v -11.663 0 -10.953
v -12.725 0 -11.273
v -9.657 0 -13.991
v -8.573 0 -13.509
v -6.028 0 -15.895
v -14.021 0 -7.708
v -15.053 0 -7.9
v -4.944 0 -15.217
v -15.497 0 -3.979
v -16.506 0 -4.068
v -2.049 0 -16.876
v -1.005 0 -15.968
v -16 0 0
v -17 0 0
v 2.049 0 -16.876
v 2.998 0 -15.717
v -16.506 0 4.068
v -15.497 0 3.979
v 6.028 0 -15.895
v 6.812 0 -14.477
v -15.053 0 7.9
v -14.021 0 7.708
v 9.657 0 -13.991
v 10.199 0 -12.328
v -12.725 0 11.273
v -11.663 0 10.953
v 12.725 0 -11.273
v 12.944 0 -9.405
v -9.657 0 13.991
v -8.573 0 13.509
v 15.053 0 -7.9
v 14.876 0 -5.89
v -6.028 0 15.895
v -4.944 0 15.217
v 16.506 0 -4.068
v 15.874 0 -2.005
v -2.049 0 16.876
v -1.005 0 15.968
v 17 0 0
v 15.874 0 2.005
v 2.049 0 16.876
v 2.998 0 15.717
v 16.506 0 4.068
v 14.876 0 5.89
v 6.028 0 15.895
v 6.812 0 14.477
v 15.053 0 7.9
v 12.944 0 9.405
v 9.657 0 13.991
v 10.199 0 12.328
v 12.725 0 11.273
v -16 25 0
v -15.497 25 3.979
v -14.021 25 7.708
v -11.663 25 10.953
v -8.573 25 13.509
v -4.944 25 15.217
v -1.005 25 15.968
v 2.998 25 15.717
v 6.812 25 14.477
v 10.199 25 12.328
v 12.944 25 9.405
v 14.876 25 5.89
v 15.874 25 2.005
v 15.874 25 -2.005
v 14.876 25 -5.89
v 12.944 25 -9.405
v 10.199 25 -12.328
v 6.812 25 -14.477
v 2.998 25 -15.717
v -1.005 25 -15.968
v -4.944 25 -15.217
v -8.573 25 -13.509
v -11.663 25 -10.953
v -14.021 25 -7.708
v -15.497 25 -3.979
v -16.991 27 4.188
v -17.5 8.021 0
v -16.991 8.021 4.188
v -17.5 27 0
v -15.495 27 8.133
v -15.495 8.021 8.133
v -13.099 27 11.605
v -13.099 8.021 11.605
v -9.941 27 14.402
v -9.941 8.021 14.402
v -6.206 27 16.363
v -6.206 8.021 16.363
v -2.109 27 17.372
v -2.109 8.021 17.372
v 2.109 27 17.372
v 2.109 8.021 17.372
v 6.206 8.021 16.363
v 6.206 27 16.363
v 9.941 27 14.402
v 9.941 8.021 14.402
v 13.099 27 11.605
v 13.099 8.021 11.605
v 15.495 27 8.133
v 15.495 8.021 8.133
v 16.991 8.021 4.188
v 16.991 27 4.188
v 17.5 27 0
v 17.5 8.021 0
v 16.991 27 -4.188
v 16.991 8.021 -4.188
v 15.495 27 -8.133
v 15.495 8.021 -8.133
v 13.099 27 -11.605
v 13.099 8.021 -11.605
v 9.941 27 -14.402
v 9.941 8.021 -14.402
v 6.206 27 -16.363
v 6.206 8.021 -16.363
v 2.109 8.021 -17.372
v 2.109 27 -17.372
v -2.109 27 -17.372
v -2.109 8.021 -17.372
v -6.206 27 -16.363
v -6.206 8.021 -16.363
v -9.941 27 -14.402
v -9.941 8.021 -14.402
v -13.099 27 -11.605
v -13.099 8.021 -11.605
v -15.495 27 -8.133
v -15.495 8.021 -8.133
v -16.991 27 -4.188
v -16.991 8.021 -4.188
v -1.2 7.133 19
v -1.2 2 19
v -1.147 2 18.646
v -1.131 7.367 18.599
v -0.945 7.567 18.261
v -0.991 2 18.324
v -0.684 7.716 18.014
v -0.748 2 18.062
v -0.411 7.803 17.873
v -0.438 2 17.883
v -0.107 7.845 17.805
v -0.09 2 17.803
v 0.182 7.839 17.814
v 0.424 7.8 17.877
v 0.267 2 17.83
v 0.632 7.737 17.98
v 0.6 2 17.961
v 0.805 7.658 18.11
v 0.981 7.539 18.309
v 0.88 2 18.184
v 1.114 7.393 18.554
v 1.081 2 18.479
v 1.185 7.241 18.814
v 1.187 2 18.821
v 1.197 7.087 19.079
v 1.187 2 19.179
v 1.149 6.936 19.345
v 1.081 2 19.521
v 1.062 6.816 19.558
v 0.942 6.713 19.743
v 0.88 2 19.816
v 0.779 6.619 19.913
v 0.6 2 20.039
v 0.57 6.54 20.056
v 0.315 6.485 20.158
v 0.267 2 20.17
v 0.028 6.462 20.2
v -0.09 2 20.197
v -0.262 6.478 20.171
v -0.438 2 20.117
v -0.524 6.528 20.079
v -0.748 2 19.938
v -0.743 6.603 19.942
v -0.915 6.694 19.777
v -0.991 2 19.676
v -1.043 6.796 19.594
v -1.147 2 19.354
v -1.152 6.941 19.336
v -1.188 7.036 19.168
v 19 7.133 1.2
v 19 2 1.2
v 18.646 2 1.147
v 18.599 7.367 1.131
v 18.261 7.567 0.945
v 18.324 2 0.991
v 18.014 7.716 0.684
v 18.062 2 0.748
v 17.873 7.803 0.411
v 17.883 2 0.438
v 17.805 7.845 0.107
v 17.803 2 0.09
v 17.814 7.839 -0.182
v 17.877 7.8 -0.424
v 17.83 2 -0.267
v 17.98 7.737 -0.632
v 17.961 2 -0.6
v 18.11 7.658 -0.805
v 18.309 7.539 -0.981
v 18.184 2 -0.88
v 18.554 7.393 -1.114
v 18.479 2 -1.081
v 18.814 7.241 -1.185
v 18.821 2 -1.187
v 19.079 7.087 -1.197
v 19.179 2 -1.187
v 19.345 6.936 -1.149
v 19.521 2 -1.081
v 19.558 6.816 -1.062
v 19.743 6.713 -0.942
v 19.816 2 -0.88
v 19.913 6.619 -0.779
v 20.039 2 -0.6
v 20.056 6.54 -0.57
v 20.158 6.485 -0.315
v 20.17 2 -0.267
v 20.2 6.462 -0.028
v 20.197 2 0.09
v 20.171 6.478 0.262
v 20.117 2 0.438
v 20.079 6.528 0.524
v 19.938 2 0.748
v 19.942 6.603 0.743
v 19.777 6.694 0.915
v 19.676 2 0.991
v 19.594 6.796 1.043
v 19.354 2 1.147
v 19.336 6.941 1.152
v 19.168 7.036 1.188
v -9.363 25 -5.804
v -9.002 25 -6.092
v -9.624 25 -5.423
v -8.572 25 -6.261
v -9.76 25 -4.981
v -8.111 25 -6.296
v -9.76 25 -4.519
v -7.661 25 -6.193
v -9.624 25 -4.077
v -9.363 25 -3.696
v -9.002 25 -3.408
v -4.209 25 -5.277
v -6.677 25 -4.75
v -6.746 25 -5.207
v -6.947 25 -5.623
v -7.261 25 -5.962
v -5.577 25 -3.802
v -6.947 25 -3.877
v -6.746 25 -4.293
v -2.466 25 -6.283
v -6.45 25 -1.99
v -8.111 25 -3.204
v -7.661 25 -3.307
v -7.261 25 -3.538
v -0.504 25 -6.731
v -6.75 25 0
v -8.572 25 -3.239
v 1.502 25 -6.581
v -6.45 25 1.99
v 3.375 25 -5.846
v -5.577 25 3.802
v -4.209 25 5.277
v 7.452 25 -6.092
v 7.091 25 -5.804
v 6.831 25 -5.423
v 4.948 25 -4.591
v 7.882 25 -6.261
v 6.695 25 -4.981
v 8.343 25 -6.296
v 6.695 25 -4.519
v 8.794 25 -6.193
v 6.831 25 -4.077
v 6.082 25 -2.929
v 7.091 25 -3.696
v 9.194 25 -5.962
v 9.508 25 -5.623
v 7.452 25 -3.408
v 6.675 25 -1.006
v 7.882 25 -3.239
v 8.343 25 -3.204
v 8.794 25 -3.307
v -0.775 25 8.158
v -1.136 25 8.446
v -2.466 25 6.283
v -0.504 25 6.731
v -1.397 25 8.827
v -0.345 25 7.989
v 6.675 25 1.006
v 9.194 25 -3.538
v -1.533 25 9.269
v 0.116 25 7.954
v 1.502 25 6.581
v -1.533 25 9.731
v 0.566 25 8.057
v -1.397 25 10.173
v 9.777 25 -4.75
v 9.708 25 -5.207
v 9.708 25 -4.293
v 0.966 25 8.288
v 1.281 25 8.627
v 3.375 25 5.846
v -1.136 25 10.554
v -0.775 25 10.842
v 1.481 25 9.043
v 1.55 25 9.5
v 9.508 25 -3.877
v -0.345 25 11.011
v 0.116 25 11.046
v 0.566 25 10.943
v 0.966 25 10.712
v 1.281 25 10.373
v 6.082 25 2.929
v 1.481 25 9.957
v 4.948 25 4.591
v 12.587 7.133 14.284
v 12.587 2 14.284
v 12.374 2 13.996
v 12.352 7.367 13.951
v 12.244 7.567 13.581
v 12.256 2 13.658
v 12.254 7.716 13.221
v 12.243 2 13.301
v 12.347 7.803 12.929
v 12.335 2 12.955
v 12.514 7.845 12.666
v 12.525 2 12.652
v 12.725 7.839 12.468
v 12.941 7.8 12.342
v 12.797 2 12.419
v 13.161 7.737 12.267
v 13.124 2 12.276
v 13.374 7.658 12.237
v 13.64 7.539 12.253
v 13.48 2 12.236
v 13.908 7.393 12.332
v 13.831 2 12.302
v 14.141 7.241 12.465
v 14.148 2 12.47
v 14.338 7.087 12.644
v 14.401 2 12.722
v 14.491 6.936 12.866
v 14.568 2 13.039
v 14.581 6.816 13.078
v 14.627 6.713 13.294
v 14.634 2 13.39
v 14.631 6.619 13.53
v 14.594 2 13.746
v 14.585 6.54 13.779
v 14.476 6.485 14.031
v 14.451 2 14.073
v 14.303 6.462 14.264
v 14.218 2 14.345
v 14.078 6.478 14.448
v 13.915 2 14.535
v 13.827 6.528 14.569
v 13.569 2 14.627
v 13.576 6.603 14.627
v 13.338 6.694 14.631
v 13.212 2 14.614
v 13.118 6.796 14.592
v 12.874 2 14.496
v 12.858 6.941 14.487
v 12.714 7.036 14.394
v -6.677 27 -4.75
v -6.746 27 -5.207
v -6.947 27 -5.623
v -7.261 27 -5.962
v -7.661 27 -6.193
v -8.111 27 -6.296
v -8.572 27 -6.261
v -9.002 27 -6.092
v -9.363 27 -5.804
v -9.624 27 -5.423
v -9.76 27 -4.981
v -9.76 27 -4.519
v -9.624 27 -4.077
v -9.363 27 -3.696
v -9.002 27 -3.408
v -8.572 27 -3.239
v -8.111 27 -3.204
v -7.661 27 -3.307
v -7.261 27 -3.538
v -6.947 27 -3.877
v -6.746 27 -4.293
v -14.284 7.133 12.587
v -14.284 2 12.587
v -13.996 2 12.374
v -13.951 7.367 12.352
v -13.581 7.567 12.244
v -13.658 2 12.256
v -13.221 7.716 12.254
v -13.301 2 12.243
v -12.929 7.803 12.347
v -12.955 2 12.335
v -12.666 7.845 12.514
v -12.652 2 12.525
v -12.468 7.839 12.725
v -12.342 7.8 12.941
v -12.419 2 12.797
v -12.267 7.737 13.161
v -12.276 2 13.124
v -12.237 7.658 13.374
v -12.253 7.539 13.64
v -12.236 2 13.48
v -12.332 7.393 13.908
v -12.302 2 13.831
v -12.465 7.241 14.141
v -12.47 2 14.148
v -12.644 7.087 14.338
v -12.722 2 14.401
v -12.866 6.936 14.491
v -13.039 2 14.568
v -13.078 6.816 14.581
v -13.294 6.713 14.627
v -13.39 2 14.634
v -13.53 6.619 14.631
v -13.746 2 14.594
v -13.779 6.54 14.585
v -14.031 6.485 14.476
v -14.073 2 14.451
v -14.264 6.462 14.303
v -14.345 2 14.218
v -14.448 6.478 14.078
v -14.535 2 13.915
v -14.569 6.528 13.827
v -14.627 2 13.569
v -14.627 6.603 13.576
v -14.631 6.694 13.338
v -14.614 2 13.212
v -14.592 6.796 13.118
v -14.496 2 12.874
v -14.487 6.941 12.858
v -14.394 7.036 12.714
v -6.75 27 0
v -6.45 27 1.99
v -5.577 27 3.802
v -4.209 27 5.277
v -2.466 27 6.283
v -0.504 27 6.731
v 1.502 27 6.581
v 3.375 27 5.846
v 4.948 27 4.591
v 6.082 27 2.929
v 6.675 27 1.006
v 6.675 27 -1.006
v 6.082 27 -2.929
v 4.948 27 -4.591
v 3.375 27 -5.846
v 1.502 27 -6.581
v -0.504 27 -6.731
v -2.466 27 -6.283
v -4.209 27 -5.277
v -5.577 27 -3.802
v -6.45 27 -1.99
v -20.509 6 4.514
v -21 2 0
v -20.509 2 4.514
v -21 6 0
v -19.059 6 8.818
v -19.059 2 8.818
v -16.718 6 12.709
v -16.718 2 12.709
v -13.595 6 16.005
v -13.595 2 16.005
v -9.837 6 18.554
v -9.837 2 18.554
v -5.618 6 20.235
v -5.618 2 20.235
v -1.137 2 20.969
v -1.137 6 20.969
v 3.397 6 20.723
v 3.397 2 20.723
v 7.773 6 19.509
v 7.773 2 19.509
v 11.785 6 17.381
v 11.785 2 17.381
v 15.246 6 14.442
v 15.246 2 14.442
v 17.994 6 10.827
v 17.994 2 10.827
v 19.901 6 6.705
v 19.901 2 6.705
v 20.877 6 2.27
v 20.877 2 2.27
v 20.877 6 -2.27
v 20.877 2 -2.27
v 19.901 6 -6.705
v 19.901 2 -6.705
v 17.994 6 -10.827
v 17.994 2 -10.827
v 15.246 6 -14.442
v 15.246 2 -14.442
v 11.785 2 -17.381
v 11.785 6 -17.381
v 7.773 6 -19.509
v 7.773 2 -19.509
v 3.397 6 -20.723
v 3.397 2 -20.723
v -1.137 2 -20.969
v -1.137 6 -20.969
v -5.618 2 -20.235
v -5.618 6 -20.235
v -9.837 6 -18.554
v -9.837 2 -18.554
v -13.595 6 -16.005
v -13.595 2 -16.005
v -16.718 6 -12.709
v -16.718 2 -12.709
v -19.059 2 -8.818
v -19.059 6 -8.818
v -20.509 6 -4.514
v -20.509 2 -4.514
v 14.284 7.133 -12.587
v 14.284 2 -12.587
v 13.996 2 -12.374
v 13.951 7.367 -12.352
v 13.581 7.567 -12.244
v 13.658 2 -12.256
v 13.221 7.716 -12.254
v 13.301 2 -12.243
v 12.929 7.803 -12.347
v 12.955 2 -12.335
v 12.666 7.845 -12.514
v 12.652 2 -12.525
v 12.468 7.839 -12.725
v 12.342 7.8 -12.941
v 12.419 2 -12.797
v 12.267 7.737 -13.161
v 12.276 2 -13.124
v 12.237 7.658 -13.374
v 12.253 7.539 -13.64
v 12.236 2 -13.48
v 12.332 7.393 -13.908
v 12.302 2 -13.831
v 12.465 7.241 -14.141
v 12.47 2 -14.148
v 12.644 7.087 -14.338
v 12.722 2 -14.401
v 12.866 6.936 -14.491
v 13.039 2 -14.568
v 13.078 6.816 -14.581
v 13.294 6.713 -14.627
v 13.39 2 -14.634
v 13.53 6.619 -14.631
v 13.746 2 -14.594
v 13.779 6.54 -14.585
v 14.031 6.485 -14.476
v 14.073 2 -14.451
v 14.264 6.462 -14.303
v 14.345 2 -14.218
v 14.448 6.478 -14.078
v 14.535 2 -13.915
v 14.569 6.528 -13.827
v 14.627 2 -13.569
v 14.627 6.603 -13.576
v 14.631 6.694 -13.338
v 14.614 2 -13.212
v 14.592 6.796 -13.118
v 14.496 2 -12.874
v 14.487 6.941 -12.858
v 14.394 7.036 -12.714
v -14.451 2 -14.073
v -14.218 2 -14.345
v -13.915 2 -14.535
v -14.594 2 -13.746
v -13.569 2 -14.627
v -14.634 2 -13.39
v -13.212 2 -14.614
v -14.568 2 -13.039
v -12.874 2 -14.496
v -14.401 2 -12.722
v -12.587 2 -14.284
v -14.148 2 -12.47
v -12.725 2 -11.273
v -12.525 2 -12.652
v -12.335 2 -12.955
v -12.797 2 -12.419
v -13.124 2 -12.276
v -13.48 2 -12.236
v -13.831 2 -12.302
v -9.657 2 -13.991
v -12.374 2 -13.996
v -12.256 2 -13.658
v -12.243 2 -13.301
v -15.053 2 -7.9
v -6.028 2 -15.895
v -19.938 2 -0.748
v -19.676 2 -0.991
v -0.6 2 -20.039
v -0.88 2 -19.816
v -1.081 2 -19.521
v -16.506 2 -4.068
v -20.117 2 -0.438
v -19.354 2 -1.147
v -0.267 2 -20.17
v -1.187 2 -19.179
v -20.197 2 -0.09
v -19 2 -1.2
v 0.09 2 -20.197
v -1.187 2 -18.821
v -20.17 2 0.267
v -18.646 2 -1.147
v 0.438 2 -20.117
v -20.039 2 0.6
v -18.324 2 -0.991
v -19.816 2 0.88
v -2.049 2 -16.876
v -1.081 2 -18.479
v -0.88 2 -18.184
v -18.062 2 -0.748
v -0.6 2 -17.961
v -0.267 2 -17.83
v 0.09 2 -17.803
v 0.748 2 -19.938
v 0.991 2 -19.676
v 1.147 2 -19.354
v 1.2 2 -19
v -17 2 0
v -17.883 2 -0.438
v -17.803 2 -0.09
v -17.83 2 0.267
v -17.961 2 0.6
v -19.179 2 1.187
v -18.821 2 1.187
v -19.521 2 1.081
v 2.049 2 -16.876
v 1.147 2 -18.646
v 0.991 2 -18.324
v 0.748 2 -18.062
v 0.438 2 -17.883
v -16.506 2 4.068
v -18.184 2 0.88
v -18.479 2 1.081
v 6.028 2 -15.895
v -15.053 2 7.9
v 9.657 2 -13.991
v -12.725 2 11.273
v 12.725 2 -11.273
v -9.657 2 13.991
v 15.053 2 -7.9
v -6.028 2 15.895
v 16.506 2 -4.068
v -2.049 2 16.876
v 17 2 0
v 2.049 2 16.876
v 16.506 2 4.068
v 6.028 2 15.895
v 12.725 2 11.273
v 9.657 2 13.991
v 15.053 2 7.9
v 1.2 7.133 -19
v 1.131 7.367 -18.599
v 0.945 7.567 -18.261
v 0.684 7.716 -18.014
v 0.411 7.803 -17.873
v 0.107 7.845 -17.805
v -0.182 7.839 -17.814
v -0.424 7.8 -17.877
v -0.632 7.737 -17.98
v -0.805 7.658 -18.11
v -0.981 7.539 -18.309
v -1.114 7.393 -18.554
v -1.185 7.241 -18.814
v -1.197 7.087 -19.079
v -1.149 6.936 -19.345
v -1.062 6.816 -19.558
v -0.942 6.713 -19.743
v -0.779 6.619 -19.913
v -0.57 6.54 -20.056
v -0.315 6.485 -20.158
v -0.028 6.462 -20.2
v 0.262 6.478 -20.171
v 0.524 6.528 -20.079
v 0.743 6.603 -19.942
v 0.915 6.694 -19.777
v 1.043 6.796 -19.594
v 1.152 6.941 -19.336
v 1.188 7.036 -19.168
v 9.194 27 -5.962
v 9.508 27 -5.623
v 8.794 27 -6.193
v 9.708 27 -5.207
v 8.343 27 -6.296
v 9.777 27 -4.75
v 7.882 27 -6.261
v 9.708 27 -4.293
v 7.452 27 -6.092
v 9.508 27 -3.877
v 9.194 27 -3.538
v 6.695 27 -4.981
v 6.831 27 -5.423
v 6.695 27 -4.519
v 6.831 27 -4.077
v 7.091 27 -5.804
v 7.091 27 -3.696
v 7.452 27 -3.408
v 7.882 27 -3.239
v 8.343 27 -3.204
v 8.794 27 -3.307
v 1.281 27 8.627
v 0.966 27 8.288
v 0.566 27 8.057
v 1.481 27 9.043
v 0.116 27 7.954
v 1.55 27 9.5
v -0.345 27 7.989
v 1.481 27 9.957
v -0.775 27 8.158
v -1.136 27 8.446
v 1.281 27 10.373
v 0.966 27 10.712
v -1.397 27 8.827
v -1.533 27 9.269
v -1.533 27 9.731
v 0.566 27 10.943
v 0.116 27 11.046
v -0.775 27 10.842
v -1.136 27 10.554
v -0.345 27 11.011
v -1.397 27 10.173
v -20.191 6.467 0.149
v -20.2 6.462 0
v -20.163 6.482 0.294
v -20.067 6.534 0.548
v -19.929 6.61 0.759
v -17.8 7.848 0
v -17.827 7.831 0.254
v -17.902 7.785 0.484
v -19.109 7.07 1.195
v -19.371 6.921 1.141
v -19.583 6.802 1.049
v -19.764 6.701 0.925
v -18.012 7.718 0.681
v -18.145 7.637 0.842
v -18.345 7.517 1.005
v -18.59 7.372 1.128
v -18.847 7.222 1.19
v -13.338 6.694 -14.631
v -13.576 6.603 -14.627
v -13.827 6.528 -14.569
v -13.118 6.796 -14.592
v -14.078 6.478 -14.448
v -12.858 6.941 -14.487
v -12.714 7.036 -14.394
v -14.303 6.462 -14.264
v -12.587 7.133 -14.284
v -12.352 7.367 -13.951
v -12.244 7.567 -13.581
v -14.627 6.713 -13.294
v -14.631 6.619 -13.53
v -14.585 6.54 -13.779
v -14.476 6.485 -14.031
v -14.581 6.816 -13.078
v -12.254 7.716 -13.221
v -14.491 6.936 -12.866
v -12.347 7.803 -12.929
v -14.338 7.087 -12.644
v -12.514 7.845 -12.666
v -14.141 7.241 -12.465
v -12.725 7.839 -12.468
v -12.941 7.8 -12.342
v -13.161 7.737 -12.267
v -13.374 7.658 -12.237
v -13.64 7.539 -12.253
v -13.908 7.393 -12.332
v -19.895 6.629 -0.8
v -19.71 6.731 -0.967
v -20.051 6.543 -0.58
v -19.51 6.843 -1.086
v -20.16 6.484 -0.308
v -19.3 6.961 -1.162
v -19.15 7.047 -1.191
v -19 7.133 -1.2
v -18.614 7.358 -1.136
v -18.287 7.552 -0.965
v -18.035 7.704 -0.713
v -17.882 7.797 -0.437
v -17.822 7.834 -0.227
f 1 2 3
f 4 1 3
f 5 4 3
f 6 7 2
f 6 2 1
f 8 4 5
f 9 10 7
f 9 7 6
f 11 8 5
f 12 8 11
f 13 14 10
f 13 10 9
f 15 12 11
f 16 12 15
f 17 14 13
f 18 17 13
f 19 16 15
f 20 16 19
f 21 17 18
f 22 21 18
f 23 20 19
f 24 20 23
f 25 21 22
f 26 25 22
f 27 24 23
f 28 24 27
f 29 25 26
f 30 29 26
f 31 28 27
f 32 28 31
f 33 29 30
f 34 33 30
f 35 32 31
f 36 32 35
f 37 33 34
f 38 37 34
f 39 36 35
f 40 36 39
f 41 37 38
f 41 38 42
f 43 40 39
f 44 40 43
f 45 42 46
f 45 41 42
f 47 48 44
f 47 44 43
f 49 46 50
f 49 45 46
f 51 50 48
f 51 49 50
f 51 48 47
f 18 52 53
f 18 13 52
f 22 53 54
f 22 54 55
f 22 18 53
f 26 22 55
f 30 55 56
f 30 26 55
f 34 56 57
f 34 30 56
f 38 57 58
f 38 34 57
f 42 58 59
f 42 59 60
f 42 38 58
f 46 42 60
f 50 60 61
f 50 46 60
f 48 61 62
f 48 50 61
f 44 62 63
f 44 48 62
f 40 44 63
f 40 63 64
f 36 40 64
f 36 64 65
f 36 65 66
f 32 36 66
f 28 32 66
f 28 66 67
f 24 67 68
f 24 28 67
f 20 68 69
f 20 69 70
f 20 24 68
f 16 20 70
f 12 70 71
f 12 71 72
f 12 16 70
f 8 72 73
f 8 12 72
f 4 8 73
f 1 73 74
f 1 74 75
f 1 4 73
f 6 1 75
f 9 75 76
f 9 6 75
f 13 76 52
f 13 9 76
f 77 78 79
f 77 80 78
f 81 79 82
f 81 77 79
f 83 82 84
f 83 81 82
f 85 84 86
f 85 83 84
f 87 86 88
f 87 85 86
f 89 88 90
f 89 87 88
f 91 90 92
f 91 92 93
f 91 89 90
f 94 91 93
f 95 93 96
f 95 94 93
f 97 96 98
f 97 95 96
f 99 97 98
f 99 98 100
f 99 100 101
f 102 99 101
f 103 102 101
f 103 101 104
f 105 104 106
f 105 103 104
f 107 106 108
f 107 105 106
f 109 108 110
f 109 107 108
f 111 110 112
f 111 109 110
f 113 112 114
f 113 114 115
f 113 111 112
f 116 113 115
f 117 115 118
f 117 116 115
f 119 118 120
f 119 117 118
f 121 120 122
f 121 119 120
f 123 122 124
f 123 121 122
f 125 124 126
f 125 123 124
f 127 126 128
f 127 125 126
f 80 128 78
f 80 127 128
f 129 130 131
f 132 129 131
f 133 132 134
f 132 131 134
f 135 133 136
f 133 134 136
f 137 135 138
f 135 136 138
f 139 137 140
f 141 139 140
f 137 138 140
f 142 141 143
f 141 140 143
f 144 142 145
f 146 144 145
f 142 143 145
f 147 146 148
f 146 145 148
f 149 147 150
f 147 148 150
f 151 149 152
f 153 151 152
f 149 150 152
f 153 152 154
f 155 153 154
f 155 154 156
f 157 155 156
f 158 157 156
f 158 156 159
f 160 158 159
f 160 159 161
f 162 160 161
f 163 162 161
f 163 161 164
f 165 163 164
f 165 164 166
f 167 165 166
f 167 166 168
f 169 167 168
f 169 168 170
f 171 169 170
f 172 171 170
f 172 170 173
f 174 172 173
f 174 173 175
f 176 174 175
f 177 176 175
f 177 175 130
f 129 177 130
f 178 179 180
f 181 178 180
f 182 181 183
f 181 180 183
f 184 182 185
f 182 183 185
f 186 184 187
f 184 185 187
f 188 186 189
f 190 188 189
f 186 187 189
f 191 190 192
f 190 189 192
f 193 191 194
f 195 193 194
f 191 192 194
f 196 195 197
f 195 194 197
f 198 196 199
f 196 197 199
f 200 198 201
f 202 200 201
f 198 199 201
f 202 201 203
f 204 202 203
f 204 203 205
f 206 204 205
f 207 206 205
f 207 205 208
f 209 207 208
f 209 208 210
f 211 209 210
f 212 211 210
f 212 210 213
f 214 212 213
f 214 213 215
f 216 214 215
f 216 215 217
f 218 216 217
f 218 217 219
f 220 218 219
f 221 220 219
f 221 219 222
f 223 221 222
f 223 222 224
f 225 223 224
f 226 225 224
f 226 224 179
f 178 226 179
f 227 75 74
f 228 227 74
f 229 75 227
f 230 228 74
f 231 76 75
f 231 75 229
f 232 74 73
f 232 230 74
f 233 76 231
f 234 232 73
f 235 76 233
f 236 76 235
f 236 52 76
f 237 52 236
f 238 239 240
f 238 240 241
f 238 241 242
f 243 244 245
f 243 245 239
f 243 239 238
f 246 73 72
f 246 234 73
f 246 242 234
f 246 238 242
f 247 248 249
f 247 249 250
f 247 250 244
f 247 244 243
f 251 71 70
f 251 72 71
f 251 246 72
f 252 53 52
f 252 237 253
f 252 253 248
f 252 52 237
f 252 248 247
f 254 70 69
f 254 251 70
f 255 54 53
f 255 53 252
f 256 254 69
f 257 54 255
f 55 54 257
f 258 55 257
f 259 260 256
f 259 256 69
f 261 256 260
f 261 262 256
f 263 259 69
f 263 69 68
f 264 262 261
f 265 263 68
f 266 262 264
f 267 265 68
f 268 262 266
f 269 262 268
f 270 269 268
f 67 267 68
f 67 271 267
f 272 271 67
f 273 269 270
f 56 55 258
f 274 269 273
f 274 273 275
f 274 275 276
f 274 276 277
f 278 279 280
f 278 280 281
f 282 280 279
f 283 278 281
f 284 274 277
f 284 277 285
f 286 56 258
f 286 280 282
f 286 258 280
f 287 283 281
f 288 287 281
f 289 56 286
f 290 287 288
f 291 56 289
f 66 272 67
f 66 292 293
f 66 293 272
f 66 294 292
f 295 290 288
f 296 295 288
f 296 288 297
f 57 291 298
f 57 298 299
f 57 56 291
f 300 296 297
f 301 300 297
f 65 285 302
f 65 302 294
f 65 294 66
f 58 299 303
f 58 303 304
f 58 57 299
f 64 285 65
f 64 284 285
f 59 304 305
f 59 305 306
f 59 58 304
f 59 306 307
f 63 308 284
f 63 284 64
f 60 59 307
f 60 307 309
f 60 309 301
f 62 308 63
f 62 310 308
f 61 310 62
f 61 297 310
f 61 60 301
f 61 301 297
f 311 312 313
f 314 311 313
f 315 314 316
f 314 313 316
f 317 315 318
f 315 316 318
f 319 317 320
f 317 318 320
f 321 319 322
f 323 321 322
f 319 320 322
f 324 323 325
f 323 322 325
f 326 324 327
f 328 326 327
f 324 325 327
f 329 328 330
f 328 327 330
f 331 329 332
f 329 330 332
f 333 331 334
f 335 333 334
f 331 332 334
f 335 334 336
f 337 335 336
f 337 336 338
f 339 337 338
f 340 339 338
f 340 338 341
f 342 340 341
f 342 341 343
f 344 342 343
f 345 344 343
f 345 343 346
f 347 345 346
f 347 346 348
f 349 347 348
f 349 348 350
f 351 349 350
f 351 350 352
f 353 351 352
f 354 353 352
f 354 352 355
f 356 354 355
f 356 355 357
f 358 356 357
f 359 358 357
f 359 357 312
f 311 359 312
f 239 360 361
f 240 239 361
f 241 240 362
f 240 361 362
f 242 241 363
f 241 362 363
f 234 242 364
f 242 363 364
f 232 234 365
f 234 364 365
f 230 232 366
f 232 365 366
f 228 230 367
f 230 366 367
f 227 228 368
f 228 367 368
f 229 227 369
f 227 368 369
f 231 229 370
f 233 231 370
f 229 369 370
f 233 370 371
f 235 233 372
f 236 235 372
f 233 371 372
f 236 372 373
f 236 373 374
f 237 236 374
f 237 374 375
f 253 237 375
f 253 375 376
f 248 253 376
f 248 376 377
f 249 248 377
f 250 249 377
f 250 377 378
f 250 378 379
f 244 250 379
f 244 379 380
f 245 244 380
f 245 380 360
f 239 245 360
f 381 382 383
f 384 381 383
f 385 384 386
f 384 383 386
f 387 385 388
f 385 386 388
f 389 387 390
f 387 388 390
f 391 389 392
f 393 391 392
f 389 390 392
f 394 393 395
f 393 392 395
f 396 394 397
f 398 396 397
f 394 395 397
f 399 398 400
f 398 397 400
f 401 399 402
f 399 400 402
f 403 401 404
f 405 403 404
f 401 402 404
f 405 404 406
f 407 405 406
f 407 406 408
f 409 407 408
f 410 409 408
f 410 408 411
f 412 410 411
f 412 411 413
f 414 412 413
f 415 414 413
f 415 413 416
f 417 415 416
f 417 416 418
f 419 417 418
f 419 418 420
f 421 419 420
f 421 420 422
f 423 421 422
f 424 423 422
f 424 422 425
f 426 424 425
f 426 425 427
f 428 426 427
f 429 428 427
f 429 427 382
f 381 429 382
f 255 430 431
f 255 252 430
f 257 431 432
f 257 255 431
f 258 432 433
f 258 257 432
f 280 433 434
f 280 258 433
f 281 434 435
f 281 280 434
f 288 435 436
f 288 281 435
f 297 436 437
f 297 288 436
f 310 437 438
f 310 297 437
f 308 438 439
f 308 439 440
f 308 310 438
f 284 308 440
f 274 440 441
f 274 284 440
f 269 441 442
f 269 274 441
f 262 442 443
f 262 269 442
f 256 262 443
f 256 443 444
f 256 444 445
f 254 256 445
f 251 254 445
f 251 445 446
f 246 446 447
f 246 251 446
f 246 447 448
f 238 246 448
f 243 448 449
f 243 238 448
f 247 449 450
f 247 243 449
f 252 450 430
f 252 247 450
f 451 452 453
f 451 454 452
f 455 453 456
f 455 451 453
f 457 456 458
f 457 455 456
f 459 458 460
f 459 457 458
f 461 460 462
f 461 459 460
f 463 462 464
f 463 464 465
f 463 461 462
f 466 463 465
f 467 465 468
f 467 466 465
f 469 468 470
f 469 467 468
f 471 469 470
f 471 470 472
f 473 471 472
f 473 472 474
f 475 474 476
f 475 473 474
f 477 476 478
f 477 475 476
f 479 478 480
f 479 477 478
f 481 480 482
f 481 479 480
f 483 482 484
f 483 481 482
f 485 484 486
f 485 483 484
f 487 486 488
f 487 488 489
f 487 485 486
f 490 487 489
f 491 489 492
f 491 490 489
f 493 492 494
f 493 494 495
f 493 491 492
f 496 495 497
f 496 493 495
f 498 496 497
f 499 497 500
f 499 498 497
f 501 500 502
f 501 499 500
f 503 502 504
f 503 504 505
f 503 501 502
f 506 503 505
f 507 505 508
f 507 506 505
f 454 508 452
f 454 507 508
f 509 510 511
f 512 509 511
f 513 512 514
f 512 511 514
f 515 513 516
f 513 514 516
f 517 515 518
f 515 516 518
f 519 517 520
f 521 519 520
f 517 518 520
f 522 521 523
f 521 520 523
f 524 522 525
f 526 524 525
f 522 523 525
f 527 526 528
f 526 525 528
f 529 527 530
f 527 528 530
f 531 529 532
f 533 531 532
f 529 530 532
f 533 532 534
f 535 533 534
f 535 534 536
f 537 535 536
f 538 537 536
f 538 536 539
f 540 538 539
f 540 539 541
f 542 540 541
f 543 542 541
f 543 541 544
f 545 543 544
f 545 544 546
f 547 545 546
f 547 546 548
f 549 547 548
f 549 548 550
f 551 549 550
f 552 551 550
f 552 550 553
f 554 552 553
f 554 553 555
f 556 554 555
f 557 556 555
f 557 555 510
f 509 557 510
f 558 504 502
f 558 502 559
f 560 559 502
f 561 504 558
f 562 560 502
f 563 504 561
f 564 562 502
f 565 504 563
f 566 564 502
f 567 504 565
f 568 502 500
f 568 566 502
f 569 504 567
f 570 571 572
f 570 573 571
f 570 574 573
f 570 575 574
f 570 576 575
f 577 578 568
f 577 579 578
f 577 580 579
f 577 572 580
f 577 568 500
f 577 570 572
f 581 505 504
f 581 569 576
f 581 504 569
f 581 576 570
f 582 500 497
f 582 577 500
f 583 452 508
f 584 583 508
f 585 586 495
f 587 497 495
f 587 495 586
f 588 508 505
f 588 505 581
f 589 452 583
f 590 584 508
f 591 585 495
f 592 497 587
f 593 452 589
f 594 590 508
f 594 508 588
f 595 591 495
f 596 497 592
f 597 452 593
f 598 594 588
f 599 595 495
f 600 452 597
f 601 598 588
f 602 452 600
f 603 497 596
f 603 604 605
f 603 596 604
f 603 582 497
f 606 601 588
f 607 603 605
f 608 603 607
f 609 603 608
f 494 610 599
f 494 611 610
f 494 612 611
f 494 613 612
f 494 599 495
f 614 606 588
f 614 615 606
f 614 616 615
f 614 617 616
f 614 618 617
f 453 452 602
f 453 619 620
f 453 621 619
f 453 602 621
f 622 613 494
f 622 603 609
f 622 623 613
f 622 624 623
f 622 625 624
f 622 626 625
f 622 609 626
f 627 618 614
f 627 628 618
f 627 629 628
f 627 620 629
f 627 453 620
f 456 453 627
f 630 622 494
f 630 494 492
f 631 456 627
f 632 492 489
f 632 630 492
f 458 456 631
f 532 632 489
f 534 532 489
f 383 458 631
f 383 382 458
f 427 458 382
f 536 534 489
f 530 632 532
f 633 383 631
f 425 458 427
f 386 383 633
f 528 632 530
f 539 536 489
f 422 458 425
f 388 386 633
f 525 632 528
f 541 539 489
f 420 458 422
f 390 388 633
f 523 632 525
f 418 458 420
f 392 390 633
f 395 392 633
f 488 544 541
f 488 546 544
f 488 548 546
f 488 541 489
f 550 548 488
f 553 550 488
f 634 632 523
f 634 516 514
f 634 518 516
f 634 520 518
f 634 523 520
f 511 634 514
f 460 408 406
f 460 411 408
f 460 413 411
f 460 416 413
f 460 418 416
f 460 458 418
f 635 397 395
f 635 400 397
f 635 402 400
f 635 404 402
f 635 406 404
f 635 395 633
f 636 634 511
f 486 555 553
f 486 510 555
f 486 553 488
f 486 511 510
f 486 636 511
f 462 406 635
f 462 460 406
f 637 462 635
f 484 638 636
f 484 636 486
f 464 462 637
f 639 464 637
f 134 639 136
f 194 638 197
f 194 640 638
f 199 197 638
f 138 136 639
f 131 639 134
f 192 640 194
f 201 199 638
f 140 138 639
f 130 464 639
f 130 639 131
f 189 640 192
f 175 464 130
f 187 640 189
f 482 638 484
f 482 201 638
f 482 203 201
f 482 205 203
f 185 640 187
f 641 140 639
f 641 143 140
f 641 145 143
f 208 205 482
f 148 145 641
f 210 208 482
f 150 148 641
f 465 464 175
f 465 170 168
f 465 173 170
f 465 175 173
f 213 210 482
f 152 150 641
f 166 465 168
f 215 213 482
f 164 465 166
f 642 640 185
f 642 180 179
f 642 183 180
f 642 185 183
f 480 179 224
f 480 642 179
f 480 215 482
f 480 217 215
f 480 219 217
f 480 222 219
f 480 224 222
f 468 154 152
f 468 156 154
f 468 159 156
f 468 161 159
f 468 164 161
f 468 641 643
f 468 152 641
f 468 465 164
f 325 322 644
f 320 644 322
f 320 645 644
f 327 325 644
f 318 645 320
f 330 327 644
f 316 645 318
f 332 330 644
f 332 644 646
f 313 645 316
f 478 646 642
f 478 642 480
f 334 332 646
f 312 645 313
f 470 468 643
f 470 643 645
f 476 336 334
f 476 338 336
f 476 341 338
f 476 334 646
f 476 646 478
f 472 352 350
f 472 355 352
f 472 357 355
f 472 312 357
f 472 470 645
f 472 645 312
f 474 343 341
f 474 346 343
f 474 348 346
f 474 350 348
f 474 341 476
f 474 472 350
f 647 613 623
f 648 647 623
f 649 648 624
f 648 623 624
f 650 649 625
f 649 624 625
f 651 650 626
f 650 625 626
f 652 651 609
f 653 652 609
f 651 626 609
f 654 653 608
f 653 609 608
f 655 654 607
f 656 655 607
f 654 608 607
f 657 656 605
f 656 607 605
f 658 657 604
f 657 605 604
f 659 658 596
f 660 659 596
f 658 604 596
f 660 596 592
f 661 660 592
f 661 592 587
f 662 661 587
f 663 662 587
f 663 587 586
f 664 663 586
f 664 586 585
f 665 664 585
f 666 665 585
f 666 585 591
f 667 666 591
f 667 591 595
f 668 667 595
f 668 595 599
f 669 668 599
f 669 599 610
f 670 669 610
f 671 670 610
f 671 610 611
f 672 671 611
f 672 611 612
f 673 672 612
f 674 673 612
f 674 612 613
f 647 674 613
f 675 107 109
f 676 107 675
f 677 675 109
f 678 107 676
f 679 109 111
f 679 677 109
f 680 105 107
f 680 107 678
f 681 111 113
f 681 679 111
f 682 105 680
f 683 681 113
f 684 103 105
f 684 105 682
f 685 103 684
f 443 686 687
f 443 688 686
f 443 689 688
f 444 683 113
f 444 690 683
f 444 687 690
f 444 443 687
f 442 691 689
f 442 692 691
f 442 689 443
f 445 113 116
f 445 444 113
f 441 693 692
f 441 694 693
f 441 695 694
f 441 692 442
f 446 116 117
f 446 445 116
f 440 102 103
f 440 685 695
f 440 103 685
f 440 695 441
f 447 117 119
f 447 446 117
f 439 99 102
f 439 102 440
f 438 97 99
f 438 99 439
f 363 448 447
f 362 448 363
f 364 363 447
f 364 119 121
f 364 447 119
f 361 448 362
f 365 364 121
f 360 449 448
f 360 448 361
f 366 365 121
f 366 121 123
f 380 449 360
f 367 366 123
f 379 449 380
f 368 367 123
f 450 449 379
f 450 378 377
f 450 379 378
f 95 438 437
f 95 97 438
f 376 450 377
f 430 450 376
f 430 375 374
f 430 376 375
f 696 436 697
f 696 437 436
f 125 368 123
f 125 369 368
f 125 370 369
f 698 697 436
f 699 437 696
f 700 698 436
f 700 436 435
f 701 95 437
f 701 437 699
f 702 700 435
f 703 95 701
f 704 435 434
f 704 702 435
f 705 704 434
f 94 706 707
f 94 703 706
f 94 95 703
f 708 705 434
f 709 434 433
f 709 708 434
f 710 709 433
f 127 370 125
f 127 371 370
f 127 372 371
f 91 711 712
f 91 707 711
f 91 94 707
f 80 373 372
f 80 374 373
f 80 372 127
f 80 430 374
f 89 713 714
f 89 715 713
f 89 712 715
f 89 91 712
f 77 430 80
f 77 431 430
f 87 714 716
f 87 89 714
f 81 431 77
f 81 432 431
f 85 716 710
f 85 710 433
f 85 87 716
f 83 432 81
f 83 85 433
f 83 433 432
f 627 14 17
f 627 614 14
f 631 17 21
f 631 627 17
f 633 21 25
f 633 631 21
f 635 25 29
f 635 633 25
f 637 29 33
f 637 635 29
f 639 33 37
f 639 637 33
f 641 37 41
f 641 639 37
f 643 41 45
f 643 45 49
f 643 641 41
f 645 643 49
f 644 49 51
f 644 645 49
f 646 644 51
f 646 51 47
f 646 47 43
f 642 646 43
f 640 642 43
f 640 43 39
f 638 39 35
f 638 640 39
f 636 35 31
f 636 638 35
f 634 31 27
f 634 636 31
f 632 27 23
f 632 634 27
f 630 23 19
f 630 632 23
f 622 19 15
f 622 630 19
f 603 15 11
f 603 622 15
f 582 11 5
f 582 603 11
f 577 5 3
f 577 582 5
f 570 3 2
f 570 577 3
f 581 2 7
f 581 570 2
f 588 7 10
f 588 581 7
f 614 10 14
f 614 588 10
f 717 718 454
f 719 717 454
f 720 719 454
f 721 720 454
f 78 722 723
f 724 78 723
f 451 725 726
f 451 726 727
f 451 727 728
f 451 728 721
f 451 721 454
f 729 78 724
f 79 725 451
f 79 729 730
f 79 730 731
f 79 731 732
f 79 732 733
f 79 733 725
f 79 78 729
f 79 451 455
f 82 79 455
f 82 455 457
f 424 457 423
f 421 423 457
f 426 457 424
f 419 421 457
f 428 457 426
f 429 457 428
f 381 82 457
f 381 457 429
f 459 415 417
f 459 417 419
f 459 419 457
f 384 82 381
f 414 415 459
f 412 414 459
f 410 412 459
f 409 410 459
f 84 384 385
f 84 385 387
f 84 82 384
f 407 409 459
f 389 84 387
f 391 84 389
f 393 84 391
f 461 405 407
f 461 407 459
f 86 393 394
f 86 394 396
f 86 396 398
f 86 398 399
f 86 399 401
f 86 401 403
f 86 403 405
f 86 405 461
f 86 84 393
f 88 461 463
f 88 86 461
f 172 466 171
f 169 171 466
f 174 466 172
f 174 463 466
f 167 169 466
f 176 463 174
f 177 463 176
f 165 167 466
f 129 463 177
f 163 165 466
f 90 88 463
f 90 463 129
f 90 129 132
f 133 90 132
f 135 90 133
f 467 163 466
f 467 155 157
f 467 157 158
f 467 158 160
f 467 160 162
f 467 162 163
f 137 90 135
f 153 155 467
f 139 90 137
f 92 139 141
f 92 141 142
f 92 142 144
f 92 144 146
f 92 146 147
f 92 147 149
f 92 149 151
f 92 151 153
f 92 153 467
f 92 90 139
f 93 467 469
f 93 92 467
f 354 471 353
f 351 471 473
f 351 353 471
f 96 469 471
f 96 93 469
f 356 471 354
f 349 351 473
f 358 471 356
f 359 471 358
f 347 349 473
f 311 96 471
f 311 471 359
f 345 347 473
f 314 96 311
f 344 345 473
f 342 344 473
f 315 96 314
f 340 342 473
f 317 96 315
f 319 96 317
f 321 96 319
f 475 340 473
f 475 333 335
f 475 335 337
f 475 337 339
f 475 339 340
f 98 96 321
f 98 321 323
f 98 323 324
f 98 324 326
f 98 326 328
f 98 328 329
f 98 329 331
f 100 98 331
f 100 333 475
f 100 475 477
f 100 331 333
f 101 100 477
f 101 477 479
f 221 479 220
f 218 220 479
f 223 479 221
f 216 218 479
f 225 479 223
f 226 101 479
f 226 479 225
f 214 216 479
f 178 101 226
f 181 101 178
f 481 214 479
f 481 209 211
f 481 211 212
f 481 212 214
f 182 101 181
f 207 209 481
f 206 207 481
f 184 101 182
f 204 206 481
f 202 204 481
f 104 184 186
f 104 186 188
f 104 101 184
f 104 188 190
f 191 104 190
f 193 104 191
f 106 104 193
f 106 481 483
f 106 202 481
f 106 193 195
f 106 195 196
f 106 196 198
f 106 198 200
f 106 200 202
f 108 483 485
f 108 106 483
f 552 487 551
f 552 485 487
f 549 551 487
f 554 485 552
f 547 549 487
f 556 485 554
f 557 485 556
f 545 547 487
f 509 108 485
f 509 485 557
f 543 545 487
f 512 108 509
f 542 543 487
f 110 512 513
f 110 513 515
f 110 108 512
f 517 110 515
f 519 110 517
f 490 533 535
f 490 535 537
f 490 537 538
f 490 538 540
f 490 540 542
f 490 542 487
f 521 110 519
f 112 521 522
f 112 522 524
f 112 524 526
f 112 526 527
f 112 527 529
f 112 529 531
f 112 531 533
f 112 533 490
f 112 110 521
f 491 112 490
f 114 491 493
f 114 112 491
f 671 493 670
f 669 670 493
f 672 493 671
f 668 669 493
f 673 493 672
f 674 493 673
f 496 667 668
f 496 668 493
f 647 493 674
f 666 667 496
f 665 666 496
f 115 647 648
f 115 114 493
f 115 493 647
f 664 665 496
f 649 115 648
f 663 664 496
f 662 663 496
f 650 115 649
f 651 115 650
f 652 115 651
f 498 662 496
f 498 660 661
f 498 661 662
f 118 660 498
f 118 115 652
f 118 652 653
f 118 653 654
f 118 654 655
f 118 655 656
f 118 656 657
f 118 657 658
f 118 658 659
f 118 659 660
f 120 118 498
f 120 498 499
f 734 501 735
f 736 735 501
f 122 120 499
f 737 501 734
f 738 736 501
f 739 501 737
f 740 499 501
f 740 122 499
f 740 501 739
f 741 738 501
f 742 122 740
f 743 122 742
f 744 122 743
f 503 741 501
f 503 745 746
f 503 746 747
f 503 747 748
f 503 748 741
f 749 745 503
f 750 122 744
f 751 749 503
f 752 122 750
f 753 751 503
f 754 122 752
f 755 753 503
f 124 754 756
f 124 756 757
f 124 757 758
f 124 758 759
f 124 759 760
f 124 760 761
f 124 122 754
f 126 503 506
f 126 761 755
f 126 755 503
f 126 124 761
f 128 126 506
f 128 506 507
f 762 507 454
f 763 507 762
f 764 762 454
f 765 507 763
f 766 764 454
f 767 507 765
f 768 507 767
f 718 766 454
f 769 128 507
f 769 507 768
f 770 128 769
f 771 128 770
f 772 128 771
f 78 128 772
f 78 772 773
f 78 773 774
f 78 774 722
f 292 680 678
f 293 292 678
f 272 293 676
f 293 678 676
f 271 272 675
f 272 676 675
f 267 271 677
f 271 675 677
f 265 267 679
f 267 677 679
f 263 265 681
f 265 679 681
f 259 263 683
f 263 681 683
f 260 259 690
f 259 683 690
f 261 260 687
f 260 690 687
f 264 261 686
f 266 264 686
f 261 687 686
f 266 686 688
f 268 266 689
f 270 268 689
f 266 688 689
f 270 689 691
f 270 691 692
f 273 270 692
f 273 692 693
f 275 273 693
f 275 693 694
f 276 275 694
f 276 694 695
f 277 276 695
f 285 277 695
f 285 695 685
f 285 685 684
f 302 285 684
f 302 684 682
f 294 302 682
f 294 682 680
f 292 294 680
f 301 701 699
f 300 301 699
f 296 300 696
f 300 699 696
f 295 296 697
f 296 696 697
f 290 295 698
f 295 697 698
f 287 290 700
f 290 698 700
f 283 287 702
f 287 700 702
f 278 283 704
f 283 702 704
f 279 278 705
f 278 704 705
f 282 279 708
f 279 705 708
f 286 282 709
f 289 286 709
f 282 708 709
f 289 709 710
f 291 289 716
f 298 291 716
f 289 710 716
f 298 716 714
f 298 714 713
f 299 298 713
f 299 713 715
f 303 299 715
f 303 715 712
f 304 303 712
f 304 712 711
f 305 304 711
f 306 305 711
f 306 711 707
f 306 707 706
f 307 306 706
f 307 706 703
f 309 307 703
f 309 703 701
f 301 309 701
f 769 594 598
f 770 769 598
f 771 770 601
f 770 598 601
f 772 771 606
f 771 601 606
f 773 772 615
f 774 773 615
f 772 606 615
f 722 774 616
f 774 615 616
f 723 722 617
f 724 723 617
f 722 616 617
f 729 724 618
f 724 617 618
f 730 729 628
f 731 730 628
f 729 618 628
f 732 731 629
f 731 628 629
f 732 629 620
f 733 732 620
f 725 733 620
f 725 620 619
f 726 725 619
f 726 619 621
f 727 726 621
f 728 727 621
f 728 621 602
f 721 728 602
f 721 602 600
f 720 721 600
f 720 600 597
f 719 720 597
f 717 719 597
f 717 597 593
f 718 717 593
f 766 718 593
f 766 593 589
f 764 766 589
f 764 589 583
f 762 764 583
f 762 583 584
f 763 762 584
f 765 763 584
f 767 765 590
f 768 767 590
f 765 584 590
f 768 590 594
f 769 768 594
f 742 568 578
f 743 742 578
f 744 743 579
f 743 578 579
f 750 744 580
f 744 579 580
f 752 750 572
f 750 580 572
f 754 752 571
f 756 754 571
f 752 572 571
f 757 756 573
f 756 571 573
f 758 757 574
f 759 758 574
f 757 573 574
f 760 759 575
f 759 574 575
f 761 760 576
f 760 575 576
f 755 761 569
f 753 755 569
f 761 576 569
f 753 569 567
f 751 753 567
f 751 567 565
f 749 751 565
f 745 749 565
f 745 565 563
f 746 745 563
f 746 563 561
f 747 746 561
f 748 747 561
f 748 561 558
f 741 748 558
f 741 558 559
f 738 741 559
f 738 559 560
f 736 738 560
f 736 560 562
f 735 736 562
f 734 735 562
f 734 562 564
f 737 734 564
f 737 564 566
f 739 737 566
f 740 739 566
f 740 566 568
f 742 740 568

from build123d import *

# Parameters (mm, degrees)
SKETCH_2_R               = 1.2
CUT_EXTRUDE_1_DEPTH      = 8
PATTERN_CIRCULAR_1_COUNT = 8
SKETCH_3_R               = 1.55
CUT_EXTRUDE_2_DEPTH      = 10


with BuildPart() as part:
    # 草图1 → 旋转1 (revolve)
    with BuildSketch(Plane.XY):
        Polygon((-16, 0), (-17, 0), (-17, 2), (-21, 2), (-21, 6), (-17.5, 8.020725942), (-17.5, 27), (-6.75, 27), (-6.75, 25), (-16, 25), align=None)
    revolve(axis=Axis((0, 0, 0), (0, 1, 0)))

    # 草图2 → 切除-拉伸1 (cut)
    with BuildSketch(Plane.XZ.offset(-2)):
        with Locations((0, -19)):
            Circle(SKETCH_2_R)
    cut_extrude_1 = extrude(amount=-CUT_EXTRUDE_1_DEPTH, mode=Mode.SUBTRACT)

    # 阵列(圆周)1: 切除-拉伸1 ×8 about axis
    pattern_circular_1_axis = Axis((0, 0, 0), (0, 1, 0))
    for i in range(1, PATTERN_CIRCULAR_1_COUNT):
        add(cut_extrude_1.rotate(pattern_circular_1_axis, i * 360 / PATTERN_CIRCULAR_1_COUNT), mode=Mode.SUBTRACT)

    # 草图3 → 切除-拉伸2 (cut)
    with BuildSketch(Plane(origin=(0, 27, 0), x_dir=(1, 0, 0), z_dir=(0, 1, 0))):
        with Locations((0, -9.5)):
            Circle(SKETCH_3_R)
        with Locations((-8.227241336, 4.75)):
            Circle(SKETCH_3_R)
        with Locations((8.227241336, 4.75)):
            Circle(SKETCH_3_R)
    extrude(amount=-CUT_EXTRUDE_2_DEPTH, mode=Mode.SUBTRACT)


solid = part.part
